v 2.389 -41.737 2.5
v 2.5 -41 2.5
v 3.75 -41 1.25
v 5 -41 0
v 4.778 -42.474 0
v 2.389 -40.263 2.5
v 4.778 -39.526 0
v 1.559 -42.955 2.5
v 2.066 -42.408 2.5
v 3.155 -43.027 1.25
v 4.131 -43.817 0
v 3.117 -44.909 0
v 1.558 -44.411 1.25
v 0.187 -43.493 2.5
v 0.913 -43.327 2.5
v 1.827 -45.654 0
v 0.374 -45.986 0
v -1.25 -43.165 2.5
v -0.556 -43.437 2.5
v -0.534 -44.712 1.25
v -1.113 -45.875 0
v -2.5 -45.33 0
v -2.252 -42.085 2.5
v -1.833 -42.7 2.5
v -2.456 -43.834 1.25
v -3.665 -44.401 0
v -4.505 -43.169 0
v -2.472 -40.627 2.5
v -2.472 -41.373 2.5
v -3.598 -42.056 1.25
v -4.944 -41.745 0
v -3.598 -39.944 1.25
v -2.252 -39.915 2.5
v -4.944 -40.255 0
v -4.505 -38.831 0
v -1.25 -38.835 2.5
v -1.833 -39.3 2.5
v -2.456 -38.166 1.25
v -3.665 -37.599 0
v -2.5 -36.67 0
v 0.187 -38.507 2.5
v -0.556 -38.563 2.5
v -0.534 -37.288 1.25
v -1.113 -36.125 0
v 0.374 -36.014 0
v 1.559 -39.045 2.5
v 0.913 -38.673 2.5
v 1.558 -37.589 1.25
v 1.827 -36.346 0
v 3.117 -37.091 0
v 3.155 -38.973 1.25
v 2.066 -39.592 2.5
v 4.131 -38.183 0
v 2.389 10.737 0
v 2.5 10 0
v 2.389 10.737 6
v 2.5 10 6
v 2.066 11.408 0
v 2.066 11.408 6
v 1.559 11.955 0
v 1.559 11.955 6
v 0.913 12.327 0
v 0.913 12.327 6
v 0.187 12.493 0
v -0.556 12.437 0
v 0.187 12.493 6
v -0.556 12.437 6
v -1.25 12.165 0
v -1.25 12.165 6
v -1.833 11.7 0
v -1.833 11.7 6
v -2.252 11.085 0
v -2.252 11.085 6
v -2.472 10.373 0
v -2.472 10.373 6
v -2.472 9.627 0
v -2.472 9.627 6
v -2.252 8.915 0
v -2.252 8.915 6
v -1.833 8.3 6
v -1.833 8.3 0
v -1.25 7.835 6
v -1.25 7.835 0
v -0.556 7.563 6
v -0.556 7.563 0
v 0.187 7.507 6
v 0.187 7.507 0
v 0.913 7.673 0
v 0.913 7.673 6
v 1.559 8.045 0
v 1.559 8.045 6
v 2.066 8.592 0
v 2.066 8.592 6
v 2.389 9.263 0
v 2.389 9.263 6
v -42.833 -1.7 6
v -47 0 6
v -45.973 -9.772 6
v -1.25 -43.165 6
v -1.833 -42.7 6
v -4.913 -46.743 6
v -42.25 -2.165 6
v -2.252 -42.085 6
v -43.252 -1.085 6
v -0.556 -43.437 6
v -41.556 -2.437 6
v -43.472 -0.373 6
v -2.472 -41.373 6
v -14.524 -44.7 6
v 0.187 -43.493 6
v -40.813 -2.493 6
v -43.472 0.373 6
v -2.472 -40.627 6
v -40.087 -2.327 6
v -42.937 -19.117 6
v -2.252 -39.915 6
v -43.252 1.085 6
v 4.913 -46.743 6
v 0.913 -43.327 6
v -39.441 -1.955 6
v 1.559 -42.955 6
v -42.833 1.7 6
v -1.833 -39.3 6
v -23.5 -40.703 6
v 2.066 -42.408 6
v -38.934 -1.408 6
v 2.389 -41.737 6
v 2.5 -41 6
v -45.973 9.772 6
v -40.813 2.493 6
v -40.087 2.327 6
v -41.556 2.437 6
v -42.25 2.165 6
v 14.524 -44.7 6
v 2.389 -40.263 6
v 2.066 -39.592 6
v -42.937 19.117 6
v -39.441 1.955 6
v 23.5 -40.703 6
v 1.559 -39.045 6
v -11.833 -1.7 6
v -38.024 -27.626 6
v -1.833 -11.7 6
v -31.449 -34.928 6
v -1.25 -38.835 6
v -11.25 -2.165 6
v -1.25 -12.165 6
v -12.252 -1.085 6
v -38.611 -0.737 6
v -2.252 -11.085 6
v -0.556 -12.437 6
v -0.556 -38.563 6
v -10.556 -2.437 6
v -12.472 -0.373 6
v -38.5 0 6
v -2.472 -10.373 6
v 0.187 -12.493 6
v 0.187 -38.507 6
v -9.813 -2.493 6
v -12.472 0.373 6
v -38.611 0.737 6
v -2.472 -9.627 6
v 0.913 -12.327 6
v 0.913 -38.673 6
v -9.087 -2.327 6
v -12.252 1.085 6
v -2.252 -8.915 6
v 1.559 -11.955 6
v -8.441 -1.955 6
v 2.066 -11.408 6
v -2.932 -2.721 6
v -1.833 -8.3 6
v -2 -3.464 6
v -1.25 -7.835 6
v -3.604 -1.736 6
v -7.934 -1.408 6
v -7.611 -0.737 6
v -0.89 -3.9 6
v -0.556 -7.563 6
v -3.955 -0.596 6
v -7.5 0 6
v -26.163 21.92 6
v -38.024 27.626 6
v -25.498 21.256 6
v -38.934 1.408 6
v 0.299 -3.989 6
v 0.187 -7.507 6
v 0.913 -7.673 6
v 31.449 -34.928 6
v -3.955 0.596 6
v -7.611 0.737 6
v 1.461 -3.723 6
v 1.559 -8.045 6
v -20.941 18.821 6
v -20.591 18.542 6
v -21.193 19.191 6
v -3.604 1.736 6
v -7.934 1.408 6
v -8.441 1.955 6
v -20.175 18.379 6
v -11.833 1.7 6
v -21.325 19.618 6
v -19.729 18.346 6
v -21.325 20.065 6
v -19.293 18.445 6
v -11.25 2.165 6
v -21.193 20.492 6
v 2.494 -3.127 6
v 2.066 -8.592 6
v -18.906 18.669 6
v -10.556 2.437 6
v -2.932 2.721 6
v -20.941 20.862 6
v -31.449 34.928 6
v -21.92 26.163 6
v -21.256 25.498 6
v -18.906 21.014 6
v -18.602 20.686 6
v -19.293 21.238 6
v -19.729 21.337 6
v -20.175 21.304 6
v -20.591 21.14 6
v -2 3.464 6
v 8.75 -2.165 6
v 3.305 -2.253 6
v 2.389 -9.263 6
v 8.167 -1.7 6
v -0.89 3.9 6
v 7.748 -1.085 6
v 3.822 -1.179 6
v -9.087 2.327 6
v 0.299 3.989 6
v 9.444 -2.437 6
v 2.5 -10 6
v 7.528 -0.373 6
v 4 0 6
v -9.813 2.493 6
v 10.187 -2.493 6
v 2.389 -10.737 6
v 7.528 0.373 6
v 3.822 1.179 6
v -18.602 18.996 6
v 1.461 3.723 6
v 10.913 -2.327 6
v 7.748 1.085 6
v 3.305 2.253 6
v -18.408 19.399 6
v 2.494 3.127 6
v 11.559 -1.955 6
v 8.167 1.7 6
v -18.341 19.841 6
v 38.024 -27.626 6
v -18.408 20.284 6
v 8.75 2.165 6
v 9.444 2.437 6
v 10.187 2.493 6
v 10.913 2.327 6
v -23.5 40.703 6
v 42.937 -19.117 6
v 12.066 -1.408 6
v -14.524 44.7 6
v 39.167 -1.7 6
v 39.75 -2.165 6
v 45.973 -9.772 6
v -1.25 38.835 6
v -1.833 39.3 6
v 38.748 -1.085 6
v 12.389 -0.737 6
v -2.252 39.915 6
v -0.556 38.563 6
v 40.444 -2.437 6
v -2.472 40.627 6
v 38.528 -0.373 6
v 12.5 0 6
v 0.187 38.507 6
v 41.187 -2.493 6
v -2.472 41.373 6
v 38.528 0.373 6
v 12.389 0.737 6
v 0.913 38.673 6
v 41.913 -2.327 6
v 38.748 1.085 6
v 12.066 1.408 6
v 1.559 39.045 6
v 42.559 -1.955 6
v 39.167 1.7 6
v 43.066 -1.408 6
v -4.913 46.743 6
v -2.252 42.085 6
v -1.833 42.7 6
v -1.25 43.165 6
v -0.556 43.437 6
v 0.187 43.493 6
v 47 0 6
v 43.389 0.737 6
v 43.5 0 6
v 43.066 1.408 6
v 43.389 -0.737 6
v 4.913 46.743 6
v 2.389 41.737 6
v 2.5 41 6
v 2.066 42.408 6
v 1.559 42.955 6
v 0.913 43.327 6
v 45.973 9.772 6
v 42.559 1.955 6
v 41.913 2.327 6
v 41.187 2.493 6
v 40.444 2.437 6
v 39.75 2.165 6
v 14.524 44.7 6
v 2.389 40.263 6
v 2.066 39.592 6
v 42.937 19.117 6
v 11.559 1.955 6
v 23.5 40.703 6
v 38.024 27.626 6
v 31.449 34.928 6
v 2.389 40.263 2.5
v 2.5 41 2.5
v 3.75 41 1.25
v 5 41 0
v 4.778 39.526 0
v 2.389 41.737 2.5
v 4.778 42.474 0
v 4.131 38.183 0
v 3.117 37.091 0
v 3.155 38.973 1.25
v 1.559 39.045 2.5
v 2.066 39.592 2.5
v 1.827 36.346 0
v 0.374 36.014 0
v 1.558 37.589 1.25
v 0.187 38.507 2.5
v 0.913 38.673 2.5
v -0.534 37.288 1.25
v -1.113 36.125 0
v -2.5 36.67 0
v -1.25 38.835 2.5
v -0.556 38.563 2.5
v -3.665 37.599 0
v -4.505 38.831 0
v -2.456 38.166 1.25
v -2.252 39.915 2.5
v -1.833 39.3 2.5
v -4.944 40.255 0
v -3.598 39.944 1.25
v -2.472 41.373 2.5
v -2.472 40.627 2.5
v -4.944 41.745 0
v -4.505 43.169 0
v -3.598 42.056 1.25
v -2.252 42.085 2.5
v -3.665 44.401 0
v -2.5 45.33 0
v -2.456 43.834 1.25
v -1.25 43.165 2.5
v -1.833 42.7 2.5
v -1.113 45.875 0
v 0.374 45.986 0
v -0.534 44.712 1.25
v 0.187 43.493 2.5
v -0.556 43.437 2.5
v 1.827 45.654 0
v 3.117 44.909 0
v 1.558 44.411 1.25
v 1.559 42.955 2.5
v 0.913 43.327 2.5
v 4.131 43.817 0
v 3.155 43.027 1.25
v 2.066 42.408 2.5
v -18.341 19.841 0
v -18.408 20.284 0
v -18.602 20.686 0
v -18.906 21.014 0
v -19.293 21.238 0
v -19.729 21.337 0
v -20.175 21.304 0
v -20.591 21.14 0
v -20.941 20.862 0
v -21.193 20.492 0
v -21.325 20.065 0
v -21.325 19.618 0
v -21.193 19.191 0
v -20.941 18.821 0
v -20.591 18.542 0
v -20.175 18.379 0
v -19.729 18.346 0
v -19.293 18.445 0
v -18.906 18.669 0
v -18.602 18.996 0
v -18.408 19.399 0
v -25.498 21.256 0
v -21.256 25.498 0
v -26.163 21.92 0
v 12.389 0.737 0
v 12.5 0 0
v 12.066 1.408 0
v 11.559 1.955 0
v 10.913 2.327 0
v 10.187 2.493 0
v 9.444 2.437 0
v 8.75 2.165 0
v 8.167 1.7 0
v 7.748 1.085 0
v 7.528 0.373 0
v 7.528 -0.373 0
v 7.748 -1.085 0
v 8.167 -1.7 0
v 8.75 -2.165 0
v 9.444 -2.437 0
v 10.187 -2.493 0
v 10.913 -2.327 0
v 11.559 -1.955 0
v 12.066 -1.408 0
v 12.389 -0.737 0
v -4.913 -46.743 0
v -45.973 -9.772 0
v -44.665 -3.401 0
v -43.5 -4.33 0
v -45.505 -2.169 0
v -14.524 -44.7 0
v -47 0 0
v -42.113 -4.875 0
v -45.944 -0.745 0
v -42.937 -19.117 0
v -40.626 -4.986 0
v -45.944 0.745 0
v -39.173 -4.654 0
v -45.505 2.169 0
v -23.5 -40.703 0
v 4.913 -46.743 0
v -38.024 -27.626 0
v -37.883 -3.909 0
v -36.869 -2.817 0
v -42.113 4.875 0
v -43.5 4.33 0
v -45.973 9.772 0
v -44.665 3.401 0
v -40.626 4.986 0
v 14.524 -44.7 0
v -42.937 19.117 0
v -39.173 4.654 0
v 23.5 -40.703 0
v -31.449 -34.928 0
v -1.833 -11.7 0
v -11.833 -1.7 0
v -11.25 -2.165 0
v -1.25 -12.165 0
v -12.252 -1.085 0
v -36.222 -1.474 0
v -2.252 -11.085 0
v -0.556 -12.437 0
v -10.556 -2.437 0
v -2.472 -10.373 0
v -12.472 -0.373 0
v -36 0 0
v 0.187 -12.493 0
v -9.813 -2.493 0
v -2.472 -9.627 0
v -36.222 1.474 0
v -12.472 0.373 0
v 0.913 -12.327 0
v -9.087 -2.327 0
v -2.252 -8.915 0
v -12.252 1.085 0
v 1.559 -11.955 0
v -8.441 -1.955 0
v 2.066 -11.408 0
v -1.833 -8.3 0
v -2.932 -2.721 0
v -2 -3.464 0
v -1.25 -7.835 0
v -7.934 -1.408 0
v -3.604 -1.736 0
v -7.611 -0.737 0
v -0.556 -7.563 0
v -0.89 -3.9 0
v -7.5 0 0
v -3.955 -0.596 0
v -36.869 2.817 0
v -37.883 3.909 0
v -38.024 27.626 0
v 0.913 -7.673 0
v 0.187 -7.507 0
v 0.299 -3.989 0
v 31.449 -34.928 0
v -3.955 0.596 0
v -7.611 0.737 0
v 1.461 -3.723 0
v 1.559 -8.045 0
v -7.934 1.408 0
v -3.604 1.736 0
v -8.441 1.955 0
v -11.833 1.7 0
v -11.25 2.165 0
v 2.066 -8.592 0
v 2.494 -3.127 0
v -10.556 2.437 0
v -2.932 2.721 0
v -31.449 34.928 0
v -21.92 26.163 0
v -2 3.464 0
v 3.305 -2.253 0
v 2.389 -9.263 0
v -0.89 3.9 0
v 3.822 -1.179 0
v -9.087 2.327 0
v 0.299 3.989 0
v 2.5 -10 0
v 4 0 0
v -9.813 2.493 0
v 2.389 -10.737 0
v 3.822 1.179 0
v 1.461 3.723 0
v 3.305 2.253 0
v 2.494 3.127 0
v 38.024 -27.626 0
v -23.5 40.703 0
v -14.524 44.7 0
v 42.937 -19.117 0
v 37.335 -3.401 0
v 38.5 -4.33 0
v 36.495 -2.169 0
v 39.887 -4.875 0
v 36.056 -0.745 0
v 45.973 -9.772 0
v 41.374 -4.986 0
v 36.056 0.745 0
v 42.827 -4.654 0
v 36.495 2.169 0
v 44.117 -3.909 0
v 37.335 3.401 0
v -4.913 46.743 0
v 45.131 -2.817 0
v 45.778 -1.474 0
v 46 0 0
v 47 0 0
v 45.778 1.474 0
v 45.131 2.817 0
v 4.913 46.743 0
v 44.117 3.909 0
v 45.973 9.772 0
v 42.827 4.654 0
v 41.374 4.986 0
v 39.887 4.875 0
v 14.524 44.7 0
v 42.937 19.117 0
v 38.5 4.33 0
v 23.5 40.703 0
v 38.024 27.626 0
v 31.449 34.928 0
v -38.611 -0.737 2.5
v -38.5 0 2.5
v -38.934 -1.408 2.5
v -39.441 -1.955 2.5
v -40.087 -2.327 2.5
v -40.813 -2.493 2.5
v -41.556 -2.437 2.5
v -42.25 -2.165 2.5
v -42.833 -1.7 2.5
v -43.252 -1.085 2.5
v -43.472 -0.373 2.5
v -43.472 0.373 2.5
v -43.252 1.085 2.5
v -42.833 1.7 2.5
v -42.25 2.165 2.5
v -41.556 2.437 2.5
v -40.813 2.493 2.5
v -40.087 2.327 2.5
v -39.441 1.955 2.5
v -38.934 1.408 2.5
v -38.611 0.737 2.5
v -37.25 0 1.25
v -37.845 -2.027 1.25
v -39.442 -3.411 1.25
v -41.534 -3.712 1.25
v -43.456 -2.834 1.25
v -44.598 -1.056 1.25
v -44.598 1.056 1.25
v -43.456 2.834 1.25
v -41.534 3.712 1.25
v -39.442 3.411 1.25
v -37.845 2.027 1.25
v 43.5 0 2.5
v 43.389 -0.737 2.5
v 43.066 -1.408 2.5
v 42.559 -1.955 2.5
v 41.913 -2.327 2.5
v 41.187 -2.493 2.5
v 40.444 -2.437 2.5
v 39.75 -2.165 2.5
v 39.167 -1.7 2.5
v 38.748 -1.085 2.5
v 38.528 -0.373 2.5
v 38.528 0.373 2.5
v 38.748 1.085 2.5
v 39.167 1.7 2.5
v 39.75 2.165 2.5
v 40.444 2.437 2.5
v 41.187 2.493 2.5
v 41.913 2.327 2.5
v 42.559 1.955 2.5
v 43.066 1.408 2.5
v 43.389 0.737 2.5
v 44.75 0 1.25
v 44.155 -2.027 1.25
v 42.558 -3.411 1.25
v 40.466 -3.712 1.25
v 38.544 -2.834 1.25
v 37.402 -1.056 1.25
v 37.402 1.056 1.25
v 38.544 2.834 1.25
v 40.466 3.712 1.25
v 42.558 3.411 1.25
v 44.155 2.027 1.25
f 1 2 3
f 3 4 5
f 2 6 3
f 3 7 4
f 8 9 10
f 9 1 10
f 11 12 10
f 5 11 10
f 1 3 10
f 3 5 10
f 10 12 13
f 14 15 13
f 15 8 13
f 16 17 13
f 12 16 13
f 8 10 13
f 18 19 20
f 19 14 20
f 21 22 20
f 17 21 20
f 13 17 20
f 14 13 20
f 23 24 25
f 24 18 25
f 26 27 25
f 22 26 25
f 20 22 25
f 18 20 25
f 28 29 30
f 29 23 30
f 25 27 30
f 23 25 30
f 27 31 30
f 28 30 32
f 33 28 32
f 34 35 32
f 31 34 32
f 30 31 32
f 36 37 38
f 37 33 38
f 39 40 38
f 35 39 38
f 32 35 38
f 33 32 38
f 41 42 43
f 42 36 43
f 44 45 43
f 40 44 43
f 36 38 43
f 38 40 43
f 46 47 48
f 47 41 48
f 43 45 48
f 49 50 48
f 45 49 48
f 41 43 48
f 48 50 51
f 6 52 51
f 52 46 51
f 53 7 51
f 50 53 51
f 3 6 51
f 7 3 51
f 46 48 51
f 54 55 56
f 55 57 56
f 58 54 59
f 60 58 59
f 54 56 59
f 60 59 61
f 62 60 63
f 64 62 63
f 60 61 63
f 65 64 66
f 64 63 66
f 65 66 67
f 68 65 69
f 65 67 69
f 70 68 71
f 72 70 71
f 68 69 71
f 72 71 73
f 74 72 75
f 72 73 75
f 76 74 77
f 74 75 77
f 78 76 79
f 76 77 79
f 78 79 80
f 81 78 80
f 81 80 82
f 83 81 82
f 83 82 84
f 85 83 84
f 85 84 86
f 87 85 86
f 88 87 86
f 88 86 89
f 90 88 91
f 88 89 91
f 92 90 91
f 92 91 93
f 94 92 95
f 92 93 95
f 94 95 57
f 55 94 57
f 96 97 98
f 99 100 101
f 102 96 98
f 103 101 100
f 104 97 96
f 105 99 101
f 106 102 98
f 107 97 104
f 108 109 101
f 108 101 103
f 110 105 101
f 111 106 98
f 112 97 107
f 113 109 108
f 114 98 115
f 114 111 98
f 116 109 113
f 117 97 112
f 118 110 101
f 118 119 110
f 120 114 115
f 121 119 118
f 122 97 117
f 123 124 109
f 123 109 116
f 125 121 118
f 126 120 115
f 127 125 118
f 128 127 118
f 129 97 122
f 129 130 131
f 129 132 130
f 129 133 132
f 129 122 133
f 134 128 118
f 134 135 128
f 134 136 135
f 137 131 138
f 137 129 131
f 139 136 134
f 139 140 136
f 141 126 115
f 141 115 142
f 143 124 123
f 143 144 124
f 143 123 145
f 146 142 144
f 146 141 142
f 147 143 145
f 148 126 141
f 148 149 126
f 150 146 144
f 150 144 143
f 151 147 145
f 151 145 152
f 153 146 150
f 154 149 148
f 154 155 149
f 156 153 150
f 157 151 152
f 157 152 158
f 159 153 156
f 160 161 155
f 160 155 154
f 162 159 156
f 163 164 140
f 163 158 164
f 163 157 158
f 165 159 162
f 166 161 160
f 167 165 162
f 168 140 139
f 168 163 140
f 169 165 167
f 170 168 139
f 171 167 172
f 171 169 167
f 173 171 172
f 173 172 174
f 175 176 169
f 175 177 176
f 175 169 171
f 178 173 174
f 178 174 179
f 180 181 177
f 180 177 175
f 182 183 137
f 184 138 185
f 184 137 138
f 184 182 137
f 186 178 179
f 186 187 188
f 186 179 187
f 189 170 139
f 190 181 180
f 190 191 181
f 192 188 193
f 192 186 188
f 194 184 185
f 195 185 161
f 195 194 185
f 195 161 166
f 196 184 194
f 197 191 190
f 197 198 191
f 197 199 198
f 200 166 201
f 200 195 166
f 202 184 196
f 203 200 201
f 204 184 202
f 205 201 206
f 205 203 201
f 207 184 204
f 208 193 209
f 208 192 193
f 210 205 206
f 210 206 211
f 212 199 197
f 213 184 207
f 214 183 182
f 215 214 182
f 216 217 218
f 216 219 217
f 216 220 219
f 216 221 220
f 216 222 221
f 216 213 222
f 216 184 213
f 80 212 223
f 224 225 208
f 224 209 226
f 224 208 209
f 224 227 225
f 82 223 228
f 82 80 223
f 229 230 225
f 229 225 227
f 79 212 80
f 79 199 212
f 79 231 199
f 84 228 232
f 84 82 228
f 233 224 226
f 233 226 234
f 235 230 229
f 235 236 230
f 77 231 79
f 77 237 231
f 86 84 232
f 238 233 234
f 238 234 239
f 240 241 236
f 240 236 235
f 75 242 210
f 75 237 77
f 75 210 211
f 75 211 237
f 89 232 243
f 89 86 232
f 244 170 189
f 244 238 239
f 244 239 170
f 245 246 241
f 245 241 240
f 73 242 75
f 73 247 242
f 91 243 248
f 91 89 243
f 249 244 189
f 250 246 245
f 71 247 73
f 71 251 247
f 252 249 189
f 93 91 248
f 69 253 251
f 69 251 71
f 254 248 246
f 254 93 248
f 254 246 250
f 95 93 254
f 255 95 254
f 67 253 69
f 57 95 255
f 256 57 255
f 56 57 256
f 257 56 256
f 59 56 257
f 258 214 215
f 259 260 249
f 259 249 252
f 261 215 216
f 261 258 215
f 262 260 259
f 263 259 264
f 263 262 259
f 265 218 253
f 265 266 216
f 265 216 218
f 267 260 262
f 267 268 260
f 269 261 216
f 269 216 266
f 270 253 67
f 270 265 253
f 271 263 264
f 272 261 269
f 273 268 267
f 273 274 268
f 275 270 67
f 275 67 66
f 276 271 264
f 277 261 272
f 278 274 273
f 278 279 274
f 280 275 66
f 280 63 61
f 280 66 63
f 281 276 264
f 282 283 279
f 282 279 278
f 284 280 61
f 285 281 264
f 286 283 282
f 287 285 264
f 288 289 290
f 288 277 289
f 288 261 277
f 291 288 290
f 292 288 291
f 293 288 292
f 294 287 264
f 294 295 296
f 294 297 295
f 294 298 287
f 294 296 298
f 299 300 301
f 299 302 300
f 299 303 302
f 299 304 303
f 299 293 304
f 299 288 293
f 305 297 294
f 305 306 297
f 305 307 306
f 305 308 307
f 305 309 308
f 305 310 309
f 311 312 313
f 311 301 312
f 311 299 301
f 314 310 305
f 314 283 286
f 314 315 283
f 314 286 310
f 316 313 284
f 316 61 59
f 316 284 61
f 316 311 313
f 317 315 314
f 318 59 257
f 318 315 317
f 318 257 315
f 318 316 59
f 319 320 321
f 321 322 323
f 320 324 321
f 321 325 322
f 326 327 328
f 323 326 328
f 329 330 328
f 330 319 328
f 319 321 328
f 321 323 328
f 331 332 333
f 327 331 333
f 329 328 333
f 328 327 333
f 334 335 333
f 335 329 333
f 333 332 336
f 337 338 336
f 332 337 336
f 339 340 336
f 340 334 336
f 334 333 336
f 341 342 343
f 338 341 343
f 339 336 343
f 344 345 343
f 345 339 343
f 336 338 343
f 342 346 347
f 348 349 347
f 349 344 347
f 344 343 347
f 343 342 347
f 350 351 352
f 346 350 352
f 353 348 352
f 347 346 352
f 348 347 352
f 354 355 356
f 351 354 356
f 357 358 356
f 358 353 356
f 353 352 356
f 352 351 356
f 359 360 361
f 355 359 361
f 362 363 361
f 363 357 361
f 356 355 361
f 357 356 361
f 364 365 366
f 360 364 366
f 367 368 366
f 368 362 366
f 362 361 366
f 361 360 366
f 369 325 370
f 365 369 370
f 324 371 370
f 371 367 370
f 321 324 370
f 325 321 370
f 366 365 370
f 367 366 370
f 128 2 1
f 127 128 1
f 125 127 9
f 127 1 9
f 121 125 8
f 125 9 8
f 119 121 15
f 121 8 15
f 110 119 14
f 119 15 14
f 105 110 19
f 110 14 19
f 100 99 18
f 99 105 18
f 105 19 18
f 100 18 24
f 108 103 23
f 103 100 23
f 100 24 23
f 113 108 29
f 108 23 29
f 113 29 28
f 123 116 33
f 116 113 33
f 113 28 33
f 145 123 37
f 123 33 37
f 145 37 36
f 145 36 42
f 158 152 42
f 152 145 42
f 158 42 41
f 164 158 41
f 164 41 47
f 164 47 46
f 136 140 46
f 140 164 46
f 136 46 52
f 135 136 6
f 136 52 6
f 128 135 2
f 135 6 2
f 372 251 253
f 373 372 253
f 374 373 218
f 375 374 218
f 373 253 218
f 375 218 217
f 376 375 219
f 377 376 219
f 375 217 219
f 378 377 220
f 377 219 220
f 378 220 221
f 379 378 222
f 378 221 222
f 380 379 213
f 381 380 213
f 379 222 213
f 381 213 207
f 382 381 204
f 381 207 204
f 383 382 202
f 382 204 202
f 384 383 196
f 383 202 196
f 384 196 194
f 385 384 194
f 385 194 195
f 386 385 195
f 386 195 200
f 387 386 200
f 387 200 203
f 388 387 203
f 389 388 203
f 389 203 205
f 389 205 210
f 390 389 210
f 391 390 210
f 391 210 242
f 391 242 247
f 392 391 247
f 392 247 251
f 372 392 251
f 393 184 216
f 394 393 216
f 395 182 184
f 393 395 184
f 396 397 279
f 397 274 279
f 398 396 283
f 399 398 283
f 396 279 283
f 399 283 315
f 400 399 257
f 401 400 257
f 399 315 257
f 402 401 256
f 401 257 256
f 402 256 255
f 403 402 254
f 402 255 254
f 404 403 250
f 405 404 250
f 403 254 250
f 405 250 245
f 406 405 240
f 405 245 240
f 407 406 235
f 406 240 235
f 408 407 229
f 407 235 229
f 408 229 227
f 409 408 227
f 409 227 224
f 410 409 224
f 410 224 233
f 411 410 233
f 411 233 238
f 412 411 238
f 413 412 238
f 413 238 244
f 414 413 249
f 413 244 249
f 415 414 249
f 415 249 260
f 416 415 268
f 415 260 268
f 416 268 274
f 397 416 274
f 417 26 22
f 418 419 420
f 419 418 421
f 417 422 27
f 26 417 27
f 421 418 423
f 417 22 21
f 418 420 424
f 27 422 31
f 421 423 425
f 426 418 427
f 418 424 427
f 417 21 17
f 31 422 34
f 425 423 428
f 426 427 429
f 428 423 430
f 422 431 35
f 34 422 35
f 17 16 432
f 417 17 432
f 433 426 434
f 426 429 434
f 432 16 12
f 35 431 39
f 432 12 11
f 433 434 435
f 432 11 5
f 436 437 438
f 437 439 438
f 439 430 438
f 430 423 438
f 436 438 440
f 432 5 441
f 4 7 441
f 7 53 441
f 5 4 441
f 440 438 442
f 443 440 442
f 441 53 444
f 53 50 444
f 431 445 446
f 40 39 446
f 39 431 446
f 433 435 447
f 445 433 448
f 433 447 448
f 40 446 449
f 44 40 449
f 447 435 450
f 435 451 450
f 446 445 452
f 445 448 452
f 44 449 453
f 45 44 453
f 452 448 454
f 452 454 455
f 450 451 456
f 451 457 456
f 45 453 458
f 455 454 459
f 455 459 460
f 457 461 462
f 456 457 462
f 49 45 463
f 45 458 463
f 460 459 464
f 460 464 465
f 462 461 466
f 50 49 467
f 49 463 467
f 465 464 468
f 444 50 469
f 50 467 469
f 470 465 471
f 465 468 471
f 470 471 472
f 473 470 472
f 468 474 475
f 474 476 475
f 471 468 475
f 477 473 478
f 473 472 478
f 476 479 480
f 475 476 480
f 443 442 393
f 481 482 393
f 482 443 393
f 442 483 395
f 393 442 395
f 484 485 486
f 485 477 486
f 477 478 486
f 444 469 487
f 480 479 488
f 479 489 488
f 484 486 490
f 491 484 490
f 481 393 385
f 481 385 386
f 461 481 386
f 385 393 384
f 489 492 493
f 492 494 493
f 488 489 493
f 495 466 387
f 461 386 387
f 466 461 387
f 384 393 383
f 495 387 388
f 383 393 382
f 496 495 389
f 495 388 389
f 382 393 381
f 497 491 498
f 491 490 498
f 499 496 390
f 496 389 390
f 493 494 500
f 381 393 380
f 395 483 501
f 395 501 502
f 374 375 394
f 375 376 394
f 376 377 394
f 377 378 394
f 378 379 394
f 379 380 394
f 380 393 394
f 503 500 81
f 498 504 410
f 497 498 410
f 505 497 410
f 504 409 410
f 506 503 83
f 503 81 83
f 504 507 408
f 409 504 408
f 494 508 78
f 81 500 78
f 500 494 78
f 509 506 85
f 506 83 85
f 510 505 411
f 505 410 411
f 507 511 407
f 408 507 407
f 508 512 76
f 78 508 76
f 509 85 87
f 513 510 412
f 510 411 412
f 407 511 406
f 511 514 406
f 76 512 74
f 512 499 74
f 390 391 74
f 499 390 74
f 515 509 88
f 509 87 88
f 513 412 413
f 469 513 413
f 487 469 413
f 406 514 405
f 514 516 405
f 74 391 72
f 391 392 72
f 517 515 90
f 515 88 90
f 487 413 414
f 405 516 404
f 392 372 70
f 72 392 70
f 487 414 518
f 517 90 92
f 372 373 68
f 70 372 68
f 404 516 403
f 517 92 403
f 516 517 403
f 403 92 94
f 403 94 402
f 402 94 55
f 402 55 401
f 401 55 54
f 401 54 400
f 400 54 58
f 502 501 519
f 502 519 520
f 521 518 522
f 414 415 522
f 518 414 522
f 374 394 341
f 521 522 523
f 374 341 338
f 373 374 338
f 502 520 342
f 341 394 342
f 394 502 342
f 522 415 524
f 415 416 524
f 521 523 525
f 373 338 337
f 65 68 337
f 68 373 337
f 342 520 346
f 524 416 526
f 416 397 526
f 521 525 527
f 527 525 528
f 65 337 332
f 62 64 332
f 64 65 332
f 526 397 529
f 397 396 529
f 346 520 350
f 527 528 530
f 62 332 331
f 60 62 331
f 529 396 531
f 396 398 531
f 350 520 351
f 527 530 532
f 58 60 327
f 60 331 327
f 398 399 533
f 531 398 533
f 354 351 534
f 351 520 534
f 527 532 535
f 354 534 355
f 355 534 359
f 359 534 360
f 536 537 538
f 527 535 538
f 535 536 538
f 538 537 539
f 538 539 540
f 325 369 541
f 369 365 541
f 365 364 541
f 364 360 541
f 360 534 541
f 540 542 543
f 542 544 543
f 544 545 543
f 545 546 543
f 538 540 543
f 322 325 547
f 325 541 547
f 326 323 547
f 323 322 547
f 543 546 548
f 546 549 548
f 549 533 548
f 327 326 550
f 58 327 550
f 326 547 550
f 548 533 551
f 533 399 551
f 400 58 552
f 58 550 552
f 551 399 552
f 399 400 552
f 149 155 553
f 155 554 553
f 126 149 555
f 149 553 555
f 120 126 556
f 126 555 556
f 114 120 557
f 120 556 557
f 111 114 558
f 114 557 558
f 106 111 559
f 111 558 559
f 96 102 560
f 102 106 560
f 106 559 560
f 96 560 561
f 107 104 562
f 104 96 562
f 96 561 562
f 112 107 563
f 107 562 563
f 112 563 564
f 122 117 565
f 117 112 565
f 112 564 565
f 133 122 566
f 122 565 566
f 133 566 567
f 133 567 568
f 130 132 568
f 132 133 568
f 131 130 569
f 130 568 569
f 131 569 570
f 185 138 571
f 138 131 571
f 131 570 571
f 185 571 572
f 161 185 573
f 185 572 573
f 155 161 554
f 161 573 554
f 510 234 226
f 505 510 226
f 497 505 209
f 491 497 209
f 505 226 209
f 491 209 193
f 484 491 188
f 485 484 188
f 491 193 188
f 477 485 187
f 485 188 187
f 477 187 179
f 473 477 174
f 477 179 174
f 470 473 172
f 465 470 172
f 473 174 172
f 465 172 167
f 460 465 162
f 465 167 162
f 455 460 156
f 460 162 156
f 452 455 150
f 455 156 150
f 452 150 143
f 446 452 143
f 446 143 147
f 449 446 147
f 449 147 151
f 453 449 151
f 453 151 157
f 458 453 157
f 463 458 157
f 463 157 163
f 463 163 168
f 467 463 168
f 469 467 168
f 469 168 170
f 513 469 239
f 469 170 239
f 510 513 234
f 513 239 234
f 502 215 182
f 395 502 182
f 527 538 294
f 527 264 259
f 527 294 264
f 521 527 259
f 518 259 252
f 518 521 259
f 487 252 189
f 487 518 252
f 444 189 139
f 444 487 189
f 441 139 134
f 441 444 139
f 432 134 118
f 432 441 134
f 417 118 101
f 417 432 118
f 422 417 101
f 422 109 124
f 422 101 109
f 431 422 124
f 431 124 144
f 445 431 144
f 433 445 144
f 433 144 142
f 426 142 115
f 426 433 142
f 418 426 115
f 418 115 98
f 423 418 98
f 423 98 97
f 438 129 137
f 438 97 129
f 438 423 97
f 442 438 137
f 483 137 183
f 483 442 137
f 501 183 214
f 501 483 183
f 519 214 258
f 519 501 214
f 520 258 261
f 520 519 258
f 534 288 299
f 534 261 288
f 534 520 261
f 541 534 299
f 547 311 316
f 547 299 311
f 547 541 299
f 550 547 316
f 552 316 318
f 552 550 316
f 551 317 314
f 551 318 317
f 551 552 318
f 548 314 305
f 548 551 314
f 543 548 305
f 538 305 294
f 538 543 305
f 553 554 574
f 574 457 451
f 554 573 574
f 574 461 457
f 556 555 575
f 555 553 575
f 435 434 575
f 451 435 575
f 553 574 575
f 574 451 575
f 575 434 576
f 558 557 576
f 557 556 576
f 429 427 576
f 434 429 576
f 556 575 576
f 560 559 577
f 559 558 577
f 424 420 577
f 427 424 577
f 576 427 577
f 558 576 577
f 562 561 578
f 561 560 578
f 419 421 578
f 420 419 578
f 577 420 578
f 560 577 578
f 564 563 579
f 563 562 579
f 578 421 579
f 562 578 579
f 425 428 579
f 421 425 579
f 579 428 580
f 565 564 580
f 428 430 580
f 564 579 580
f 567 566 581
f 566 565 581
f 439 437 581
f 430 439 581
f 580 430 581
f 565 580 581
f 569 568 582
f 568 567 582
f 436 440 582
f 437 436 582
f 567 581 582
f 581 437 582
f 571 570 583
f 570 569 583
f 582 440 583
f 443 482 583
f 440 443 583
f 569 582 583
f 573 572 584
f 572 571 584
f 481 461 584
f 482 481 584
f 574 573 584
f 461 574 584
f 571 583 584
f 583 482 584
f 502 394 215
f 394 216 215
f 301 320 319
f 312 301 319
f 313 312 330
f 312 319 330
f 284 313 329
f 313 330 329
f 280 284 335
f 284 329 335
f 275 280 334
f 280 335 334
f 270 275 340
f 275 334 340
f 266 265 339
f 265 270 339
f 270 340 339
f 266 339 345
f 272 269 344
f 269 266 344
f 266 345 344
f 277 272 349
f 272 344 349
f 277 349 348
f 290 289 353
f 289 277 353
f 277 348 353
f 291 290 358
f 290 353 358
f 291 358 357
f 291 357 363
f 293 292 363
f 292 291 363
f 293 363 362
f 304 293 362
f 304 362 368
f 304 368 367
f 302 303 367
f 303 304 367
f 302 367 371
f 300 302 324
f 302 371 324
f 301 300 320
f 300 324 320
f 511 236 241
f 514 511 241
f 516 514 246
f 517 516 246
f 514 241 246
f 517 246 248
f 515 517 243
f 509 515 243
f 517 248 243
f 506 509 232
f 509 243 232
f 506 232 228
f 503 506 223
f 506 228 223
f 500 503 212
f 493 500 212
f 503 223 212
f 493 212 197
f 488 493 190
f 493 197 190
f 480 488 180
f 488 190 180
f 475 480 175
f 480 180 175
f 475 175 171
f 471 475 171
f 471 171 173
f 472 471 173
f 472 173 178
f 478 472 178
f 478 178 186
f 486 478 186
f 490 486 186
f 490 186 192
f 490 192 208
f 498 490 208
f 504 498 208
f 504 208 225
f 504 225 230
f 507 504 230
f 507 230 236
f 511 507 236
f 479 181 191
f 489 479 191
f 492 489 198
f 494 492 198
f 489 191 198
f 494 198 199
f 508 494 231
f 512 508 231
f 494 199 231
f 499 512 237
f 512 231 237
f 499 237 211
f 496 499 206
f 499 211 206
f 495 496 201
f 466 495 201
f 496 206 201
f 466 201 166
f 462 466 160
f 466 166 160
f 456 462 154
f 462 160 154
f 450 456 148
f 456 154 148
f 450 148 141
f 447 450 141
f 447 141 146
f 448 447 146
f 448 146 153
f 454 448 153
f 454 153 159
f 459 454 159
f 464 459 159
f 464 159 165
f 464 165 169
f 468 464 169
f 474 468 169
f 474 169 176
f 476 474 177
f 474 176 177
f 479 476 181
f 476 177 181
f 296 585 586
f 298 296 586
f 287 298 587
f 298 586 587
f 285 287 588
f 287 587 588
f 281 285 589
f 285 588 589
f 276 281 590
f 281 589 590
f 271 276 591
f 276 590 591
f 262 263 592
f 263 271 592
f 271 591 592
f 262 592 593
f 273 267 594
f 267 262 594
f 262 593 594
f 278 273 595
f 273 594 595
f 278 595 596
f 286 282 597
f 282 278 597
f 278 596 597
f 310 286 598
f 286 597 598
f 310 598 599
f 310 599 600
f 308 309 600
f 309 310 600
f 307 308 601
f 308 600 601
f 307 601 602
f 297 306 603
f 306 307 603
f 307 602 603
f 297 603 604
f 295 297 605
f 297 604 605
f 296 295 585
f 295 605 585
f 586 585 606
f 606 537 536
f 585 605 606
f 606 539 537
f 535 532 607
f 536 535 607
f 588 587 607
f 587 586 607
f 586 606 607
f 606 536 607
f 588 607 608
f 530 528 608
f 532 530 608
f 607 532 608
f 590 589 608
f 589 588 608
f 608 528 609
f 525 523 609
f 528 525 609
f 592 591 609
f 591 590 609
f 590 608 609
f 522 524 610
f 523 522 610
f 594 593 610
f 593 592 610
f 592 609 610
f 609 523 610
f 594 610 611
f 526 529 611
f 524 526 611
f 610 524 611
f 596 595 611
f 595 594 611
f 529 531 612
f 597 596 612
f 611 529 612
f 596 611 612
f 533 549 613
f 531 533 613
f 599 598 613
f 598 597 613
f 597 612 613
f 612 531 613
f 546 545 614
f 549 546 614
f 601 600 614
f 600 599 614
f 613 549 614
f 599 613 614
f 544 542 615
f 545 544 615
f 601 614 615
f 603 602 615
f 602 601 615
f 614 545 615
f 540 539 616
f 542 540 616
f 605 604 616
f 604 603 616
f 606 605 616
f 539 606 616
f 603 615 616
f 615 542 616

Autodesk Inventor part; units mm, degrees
ref_plane "YZ Plane" through (0, 0, 0) normal (1, 0, 0) x (0, 1, 0)
ref_plane "XZ Plane" through (0, 0, 0) normal (0, 1, 0) x (-1, 0, 0)
ref_plane "XY Plane" through (0, 0, 0) normal (0, 0, 1) x (1, 0, 0)
sketch "草圖1" plane through (0, 0, 0) normal (0, 0, 1) x (1, 0, 0)
  circle A0 centre (0, 0) radius 47 projected
  circle A1 centre (40.0673, -8.6957) radius 2.5 construction
  circle A2 centre (-8.6957, -40.0673) radius 2.5 construction
  circle A3 centre (-40.0673, 8.6957) radius 2.5 construction
  circle A4 centre (8.6957, 40.0673) radius 2.5 construction
  circle A5 centre (0, 0) radius 41 construction
  circle A6 centre (41, 0) radius 2.5
  circle A7 centre (0, 41) radius 2.5
  circle A8 centre (-41, 0) radius 2.5
  circle A9 centre (0, -41) radius 2.5
  point P0 (0, 0)
  dimension "d11" = 5
  dimension "d14" = 360
extrude "擠出1" add sketch "草圖1" along normal blind 6
sketch "草圖3" plane through (0, 0, 6) normal (0, 0, 1) x (1, 0, 0)
  circle A0 centre (0, 0) radius 4
  dimension "d4" = 8
extrude "擠出3" cut sketch "草圖3" against normal through all
sketch "草圖6" plane through (0, 0, 6) normal (0, 0, 1) x (1, 0, 0)
  circle A0 centre (9.4848, 3.1685) radius 2.5 construction
  circle A1 centre (-9.4848, -3.1685) radius 2.5 construction
  circle A2 centre (3.1685, -9.4848) radius 2.5 construction
  circle A3 centre (-3.1685, 9.4848) radius 2.5 construction
  circle A4 centre (0, 0) radius 21 projected
  circle A5 centre (0, 0) radius 4 projected
  circle A6 centre (0, 0) radius 10 construction
  circle A7 centre (10, 0) radius 2.5
  circle A8 centre (0, 10) radius 2.5
  circle A9 centre (-10, 0) radius 2.5
  circle A10 centre (0, -10) radius 2.5
  point P0 (0, 0)
  dimension "d16" = 5
  dimension "d19" = 360
extrude "擠出5" cut sketch "草圖6" against normal through all contours A7 | A8 | A9 | A10
sketch "草圖10" plane through (0, 0, 6) normal (0, 0, 1) x (1, 0, 0)
  circle A0 centre (-19.8414, 19.8414) radius 1.5
  line L0 (-21.9203, 26.163) -> (-26.163, 21.9203)
  line L1 (-26.163, 21.9203) -> (-25.4983, 21.2556)
  line L2 (-25.4983, 21.2556) -> (-21.2556, 25.4983)
  line L3 (-21.2556, 25.4983) -> (-21.9203, 26.163)
  line L4 (0, 0) -> (-33.234, 33.234) construction
  line L5 (0, 0) -> (18.5986, 0) construction
  circle A1 centre (0, 0) radius 47 projected
  point P0 (-23.377, 23.377)
  dimension "d30" = 3
  dimension "d31" = 0.94
  dimension "d35" = 5
  dimension "d38" = 135
  dimension "d39" = 6
  dimension "d40" = 34
extrude "擠出7" cut sketch "草圖10" against normal through all contours A0 | L3 L2 L1 L0
sketch "草圖11" plane through (0, 0, 6) normal (0, 0, 1) x (1, 0, 0)
  circle A0 centre (-19.8414, 19.8414) radius 1.5 projected
  line L0 (-21.2556, 25.4983) -> (-25.4983, 21.2556) projected
  line L1 (-25.4983, 21.2556) -> (-26.163, 21.9203) projected
  line L2 (-26.163, 21.9203) -> (-21.9203, 26.163) projected
  line L3 (-21.9203, 26.163) -> (-21.2556, 25.4983) projected
  circle A1 centre (-10, 0) radius 2.5 projected
  circle A2 centre (0, 10) radius 2.5 projected
  circle A3 centre (0, -10) radius 2.5 projected
  circle A4 centre (10, 0) radius 2.5 projected
  circle A5 centre (0, 0) radius 4 projected
  circle A6 centre (0, 0) radius 47 projected
  circle A7 centre (0, -41) radius 2.5 projected
  circle A8 centre (-41, 0) radius 2.5 projected
  circle A9 centre (0, 41) radius 2.5 projected
  circle A10 centre (41, 0) radius 2.5 projected
chamfer "倒角1" distance 2.5 angle 45 4 edges at (-2.5, -41, 0) (38.5, 0, 0) (-43.5, 0, 0) (-2.5, 41, 0)
properties part number "base gear base plate"
